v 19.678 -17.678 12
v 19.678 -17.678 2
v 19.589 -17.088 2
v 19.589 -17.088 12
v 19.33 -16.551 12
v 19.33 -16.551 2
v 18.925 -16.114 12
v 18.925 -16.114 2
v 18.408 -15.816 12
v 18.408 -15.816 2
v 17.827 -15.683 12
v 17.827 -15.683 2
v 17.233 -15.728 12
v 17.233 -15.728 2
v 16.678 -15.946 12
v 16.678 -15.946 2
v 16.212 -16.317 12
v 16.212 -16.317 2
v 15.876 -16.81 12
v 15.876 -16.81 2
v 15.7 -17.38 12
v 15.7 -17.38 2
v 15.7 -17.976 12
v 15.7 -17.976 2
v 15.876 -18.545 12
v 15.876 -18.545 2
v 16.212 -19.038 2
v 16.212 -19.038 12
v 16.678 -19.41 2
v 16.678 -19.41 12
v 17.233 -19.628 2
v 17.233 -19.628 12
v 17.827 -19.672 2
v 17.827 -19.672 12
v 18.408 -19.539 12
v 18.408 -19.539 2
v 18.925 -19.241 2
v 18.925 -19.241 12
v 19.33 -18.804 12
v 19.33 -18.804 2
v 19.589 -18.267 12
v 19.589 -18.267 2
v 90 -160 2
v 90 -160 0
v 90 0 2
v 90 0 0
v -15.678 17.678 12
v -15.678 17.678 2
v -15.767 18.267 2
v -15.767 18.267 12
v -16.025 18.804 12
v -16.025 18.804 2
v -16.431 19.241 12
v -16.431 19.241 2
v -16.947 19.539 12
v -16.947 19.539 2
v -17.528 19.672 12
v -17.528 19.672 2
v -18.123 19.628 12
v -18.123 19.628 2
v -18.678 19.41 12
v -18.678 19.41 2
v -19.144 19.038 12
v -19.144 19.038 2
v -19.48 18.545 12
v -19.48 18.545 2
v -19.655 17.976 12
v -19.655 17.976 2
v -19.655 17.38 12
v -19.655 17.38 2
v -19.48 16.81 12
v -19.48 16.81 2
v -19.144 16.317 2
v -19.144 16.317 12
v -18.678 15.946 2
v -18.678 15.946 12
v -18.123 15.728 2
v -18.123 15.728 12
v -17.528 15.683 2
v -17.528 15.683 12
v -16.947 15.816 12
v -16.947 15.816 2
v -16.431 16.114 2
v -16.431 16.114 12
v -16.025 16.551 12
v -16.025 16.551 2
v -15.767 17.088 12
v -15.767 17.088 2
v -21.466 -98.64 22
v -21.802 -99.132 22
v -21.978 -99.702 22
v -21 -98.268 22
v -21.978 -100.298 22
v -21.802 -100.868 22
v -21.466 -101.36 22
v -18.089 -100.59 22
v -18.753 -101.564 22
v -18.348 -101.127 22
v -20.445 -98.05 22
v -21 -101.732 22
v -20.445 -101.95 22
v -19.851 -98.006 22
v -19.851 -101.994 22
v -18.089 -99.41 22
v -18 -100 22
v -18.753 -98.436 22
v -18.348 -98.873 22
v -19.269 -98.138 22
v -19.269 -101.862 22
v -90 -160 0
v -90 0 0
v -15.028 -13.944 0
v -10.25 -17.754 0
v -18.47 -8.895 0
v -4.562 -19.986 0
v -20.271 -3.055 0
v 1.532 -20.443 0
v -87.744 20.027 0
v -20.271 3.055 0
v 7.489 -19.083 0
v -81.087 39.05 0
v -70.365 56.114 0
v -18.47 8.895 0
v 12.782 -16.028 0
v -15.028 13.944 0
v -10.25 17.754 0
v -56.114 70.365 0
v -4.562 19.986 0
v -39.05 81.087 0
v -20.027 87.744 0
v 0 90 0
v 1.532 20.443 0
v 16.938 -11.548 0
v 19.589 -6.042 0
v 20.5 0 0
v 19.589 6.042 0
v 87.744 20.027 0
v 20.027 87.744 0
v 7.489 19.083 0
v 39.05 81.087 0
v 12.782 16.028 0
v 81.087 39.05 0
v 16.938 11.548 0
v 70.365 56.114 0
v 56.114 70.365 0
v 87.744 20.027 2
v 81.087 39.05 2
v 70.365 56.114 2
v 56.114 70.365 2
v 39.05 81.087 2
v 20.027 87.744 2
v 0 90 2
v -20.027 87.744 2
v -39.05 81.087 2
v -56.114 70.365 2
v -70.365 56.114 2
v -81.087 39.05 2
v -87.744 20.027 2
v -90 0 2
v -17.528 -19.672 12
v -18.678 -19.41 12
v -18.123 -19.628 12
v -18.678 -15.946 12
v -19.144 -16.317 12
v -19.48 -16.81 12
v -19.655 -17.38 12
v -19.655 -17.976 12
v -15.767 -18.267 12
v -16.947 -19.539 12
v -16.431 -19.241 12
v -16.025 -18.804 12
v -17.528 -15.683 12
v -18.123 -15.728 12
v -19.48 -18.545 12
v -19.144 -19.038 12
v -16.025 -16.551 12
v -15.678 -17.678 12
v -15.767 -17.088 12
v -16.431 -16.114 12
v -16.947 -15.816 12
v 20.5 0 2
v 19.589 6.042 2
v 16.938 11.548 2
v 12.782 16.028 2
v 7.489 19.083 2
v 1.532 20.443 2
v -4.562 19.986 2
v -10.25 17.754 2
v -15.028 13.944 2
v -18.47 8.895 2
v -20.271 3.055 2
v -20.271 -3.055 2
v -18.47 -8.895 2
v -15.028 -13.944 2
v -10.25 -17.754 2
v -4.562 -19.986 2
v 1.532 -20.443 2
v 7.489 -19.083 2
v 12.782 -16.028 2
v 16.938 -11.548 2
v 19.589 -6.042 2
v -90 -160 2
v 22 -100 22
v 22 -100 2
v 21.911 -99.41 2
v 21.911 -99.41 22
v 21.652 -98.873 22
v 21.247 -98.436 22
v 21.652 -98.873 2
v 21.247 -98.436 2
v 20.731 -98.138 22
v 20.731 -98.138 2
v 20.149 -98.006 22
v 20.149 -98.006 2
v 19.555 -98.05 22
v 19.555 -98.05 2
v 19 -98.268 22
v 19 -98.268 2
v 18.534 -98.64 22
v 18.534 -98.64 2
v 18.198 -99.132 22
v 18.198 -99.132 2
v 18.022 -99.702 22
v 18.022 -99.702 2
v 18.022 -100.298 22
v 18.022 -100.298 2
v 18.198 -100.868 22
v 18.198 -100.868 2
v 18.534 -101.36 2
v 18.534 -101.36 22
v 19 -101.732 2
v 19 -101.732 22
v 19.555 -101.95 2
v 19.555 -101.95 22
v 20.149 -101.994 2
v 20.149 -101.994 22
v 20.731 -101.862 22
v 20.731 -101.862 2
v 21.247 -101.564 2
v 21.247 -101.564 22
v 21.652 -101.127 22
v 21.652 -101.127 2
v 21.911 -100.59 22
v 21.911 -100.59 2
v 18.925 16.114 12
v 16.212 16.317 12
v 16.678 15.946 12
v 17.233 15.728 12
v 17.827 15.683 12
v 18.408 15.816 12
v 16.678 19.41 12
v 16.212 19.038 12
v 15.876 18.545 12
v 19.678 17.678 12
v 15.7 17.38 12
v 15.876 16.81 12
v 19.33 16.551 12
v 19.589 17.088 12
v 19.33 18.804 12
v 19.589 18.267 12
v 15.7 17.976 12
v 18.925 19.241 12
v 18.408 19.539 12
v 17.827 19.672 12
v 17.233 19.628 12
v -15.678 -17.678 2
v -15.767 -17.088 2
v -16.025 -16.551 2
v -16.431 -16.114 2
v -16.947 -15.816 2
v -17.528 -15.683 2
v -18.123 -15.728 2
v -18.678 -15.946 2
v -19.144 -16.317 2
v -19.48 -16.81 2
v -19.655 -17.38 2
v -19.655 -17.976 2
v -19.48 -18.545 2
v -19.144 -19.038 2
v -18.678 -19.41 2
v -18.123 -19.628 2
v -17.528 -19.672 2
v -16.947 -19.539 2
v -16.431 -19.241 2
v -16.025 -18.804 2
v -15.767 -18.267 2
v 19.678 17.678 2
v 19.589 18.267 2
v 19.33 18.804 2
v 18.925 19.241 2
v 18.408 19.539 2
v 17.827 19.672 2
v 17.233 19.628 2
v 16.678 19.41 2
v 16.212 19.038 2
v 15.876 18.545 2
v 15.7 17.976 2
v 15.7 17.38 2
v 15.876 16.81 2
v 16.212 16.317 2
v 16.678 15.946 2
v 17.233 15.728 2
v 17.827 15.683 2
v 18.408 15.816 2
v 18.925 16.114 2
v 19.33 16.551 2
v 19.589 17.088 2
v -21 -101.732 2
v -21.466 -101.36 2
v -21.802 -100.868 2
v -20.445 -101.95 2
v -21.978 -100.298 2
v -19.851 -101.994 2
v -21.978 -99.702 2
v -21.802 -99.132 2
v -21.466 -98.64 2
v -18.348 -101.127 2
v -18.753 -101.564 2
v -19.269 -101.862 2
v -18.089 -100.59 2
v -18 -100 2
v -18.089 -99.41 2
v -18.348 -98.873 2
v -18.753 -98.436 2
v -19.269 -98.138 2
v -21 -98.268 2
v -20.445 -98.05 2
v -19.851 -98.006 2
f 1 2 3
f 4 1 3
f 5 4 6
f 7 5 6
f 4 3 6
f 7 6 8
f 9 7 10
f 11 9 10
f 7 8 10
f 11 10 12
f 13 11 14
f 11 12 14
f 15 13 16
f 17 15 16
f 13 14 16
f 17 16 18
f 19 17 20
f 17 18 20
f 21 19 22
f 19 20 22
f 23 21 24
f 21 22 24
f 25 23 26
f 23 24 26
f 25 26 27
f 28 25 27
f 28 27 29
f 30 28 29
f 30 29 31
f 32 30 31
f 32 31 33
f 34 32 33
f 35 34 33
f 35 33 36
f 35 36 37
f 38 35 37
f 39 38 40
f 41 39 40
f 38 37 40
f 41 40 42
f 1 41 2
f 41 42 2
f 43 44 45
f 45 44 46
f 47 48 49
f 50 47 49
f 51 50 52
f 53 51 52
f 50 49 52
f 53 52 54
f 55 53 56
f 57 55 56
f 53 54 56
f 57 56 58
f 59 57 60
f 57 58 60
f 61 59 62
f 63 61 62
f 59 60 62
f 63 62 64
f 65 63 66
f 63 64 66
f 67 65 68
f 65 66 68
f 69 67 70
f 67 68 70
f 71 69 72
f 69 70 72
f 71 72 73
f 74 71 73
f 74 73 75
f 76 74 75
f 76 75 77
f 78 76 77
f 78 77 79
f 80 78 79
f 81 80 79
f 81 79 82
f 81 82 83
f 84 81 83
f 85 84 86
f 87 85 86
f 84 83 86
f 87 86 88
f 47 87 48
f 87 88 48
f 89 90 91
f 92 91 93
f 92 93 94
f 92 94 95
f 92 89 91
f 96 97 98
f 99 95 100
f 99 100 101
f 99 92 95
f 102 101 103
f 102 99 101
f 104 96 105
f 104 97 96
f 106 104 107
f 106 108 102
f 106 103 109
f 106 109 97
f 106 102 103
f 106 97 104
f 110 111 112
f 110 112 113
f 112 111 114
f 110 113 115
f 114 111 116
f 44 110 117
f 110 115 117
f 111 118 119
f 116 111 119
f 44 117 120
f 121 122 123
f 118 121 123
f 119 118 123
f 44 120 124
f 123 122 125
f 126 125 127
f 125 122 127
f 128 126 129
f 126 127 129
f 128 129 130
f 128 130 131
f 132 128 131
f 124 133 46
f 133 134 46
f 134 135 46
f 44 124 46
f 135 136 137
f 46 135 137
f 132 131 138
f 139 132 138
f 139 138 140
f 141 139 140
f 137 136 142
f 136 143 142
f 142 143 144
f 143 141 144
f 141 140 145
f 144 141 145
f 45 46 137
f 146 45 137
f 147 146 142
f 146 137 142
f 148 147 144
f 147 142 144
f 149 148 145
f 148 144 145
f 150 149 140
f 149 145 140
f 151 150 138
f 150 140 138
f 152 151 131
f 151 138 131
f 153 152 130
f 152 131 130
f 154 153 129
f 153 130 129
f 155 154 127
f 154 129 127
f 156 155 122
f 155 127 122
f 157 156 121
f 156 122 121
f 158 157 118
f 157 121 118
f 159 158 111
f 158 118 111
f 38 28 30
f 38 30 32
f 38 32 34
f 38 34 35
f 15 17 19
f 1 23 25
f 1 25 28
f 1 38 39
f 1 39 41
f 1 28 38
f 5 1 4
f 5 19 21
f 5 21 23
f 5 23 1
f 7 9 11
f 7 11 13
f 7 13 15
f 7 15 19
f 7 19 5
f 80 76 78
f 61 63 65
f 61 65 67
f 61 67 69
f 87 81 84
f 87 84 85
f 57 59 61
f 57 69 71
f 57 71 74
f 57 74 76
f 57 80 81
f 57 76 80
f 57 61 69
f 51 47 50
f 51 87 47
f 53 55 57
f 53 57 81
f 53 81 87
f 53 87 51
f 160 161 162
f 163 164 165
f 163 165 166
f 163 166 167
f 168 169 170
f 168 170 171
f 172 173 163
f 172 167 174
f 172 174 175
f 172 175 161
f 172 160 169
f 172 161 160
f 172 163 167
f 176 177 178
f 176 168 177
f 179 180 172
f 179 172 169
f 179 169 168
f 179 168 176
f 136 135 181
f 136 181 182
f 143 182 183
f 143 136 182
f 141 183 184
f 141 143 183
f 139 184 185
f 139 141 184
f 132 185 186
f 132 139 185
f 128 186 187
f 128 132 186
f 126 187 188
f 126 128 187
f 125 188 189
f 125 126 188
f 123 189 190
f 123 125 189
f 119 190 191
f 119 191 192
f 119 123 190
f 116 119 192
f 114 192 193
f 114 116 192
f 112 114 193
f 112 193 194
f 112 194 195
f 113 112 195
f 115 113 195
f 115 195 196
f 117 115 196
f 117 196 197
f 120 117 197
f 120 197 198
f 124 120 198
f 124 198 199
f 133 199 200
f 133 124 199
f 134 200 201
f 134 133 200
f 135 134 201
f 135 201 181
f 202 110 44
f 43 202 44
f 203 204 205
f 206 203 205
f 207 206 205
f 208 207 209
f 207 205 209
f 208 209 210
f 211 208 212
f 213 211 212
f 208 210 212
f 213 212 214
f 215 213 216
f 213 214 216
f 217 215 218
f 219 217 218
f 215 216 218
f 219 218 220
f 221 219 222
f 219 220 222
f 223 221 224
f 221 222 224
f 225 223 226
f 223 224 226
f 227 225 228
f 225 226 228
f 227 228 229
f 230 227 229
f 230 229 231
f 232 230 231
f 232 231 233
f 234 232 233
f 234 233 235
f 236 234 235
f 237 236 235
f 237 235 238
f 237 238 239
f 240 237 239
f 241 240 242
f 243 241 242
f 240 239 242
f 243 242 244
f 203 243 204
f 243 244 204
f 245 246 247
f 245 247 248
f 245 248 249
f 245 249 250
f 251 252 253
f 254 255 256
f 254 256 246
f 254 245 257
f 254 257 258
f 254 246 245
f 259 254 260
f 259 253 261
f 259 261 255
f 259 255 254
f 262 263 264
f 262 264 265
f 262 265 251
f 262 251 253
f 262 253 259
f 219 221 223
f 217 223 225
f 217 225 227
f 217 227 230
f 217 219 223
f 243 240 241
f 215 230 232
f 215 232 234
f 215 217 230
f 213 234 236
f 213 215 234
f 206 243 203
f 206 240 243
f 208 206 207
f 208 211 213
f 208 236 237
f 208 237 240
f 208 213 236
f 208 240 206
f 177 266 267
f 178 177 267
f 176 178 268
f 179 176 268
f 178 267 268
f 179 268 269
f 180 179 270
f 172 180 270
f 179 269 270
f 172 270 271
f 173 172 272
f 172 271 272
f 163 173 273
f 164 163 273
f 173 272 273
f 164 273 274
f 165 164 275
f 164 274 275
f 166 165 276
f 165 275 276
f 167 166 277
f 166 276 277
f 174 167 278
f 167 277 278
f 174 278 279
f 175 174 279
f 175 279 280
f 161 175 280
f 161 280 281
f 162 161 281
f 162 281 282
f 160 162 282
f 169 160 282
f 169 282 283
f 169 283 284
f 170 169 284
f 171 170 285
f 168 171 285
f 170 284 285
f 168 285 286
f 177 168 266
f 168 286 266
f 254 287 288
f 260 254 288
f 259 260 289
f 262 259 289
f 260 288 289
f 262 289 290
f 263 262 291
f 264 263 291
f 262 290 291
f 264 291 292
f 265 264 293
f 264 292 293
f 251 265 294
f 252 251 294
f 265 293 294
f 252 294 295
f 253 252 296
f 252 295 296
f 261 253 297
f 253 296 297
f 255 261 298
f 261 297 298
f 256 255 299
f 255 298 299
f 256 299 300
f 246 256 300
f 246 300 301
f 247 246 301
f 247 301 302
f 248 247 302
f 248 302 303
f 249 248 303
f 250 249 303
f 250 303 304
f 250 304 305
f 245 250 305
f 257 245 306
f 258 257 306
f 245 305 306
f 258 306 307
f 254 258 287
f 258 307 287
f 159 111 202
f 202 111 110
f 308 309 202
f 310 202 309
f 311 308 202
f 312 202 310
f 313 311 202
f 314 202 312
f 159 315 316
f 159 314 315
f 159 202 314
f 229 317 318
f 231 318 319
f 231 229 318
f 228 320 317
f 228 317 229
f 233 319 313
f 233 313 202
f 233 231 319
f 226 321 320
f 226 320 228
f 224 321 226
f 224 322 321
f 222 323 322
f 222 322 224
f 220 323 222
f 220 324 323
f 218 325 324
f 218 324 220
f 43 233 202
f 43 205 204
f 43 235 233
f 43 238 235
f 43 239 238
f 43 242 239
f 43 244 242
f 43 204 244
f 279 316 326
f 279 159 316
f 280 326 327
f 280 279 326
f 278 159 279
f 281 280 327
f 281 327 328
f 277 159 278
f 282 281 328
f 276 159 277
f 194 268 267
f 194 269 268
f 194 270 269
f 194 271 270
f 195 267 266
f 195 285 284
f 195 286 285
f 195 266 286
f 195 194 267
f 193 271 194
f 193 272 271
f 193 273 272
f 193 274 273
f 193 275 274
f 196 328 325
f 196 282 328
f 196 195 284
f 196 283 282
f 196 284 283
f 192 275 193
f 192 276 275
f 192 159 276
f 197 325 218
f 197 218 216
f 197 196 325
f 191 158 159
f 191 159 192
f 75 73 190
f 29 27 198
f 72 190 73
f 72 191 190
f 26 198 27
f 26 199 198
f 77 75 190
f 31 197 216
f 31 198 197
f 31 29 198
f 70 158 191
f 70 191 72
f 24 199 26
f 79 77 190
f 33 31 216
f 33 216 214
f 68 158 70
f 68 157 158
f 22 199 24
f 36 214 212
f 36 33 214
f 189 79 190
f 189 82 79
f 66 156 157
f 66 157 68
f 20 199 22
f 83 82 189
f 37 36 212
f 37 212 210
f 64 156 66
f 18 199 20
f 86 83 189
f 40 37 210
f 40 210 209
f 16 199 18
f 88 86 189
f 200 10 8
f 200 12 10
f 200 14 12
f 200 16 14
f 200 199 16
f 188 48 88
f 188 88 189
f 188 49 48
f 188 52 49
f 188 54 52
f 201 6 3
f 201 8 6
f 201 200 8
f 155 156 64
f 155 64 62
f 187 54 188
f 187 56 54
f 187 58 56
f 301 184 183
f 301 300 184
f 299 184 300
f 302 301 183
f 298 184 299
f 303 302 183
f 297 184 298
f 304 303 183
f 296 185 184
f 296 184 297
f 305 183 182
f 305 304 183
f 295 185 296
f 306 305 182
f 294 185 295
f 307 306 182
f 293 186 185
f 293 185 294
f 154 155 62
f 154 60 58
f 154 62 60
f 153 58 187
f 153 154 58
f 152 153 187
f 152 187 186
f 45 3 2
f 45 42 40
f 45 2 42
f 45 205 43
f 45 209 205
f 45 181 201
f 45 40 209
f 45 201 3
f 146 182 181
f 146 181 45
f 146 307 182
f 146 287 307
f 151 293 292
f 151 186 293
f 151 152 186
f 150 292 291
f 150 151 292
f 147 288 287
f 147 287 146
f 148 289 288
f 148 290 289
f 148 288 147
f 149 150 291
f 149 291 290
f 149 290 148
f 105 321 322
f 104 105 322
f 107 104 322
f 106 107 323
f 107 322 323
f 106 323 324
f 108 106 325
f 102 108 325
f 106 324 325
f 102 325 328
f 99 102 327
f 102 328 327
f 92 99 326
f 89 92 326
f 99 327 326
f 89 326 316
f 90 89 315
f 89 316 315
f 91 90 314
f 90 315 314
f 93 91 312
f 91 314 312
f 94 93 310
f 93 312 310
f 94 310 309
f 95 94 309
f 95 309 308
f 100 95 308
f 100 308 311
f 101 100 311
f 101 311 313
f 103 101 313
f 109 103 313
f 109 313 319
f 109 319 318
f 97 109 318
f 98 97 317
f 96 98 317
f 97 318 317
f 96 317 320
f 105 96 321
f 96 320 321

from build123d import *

# Parameters (mm, degrees)
ESQUISSE1_R        = 20.5
BOSS_EXTRU_1_DEPTH = 2
ESQUISSE2_R        = 2
GOUJON_M4X10_DEPTH = 10
ESQUISSE3_R        = 2
GOUJON_M4X20_DEPTH = 20


with BuildPart() as part:
    # Esquisse1 → Boss.-Extru.1 (new body)
    with BuildSketch(Plane.XY):
        with BuildLine():
            Line((-90, -160), (90, -160))
            Line((90, -160), (90, 0))
            ThreePointArc((90, 0), (0, 90), (-90, 0))
            Line((-90, 0), (-90, -160))
        make_face()
        Circle(ESQUISSE1_R, mode=Mode.SUBTRACT)
    extrude(amount=BOSS_EXTRU_1_DEPTH)

    # Esquisse2 → Goujon M4x10 (add)
    with BuildSketch(Plane.XY.offset(2)):
        with Locations((-17.67766953, 17.67766953)):
            Circle(ESQUISSE2_R)
        with Locations((17.67766953, 17.67766953)):
            Circle(ESQUISSE2_R)
        with Locations((17.67766953, -17.67766953)):
            Circle(ESQUISSE2_R)
        with Locations((-17.67766953, -17.67766953)):
            Circle(ESQUISSE2_R)
    extrude(amount=GOUJON_M4X10_DEPTH)

    # Esquisse3 → Goujon M4x20 (add)
    with BuildSketch(Plane.XY.offset(2)):
        with Locations((-20, -100)):
            Circle(ESQUISSE3_R)
        with Locations((20, -100)):
            Circle(ESQUISSE3_R)
    extrude(amount=GOUJON_M4X20_DEPTH)


solid = part.part
